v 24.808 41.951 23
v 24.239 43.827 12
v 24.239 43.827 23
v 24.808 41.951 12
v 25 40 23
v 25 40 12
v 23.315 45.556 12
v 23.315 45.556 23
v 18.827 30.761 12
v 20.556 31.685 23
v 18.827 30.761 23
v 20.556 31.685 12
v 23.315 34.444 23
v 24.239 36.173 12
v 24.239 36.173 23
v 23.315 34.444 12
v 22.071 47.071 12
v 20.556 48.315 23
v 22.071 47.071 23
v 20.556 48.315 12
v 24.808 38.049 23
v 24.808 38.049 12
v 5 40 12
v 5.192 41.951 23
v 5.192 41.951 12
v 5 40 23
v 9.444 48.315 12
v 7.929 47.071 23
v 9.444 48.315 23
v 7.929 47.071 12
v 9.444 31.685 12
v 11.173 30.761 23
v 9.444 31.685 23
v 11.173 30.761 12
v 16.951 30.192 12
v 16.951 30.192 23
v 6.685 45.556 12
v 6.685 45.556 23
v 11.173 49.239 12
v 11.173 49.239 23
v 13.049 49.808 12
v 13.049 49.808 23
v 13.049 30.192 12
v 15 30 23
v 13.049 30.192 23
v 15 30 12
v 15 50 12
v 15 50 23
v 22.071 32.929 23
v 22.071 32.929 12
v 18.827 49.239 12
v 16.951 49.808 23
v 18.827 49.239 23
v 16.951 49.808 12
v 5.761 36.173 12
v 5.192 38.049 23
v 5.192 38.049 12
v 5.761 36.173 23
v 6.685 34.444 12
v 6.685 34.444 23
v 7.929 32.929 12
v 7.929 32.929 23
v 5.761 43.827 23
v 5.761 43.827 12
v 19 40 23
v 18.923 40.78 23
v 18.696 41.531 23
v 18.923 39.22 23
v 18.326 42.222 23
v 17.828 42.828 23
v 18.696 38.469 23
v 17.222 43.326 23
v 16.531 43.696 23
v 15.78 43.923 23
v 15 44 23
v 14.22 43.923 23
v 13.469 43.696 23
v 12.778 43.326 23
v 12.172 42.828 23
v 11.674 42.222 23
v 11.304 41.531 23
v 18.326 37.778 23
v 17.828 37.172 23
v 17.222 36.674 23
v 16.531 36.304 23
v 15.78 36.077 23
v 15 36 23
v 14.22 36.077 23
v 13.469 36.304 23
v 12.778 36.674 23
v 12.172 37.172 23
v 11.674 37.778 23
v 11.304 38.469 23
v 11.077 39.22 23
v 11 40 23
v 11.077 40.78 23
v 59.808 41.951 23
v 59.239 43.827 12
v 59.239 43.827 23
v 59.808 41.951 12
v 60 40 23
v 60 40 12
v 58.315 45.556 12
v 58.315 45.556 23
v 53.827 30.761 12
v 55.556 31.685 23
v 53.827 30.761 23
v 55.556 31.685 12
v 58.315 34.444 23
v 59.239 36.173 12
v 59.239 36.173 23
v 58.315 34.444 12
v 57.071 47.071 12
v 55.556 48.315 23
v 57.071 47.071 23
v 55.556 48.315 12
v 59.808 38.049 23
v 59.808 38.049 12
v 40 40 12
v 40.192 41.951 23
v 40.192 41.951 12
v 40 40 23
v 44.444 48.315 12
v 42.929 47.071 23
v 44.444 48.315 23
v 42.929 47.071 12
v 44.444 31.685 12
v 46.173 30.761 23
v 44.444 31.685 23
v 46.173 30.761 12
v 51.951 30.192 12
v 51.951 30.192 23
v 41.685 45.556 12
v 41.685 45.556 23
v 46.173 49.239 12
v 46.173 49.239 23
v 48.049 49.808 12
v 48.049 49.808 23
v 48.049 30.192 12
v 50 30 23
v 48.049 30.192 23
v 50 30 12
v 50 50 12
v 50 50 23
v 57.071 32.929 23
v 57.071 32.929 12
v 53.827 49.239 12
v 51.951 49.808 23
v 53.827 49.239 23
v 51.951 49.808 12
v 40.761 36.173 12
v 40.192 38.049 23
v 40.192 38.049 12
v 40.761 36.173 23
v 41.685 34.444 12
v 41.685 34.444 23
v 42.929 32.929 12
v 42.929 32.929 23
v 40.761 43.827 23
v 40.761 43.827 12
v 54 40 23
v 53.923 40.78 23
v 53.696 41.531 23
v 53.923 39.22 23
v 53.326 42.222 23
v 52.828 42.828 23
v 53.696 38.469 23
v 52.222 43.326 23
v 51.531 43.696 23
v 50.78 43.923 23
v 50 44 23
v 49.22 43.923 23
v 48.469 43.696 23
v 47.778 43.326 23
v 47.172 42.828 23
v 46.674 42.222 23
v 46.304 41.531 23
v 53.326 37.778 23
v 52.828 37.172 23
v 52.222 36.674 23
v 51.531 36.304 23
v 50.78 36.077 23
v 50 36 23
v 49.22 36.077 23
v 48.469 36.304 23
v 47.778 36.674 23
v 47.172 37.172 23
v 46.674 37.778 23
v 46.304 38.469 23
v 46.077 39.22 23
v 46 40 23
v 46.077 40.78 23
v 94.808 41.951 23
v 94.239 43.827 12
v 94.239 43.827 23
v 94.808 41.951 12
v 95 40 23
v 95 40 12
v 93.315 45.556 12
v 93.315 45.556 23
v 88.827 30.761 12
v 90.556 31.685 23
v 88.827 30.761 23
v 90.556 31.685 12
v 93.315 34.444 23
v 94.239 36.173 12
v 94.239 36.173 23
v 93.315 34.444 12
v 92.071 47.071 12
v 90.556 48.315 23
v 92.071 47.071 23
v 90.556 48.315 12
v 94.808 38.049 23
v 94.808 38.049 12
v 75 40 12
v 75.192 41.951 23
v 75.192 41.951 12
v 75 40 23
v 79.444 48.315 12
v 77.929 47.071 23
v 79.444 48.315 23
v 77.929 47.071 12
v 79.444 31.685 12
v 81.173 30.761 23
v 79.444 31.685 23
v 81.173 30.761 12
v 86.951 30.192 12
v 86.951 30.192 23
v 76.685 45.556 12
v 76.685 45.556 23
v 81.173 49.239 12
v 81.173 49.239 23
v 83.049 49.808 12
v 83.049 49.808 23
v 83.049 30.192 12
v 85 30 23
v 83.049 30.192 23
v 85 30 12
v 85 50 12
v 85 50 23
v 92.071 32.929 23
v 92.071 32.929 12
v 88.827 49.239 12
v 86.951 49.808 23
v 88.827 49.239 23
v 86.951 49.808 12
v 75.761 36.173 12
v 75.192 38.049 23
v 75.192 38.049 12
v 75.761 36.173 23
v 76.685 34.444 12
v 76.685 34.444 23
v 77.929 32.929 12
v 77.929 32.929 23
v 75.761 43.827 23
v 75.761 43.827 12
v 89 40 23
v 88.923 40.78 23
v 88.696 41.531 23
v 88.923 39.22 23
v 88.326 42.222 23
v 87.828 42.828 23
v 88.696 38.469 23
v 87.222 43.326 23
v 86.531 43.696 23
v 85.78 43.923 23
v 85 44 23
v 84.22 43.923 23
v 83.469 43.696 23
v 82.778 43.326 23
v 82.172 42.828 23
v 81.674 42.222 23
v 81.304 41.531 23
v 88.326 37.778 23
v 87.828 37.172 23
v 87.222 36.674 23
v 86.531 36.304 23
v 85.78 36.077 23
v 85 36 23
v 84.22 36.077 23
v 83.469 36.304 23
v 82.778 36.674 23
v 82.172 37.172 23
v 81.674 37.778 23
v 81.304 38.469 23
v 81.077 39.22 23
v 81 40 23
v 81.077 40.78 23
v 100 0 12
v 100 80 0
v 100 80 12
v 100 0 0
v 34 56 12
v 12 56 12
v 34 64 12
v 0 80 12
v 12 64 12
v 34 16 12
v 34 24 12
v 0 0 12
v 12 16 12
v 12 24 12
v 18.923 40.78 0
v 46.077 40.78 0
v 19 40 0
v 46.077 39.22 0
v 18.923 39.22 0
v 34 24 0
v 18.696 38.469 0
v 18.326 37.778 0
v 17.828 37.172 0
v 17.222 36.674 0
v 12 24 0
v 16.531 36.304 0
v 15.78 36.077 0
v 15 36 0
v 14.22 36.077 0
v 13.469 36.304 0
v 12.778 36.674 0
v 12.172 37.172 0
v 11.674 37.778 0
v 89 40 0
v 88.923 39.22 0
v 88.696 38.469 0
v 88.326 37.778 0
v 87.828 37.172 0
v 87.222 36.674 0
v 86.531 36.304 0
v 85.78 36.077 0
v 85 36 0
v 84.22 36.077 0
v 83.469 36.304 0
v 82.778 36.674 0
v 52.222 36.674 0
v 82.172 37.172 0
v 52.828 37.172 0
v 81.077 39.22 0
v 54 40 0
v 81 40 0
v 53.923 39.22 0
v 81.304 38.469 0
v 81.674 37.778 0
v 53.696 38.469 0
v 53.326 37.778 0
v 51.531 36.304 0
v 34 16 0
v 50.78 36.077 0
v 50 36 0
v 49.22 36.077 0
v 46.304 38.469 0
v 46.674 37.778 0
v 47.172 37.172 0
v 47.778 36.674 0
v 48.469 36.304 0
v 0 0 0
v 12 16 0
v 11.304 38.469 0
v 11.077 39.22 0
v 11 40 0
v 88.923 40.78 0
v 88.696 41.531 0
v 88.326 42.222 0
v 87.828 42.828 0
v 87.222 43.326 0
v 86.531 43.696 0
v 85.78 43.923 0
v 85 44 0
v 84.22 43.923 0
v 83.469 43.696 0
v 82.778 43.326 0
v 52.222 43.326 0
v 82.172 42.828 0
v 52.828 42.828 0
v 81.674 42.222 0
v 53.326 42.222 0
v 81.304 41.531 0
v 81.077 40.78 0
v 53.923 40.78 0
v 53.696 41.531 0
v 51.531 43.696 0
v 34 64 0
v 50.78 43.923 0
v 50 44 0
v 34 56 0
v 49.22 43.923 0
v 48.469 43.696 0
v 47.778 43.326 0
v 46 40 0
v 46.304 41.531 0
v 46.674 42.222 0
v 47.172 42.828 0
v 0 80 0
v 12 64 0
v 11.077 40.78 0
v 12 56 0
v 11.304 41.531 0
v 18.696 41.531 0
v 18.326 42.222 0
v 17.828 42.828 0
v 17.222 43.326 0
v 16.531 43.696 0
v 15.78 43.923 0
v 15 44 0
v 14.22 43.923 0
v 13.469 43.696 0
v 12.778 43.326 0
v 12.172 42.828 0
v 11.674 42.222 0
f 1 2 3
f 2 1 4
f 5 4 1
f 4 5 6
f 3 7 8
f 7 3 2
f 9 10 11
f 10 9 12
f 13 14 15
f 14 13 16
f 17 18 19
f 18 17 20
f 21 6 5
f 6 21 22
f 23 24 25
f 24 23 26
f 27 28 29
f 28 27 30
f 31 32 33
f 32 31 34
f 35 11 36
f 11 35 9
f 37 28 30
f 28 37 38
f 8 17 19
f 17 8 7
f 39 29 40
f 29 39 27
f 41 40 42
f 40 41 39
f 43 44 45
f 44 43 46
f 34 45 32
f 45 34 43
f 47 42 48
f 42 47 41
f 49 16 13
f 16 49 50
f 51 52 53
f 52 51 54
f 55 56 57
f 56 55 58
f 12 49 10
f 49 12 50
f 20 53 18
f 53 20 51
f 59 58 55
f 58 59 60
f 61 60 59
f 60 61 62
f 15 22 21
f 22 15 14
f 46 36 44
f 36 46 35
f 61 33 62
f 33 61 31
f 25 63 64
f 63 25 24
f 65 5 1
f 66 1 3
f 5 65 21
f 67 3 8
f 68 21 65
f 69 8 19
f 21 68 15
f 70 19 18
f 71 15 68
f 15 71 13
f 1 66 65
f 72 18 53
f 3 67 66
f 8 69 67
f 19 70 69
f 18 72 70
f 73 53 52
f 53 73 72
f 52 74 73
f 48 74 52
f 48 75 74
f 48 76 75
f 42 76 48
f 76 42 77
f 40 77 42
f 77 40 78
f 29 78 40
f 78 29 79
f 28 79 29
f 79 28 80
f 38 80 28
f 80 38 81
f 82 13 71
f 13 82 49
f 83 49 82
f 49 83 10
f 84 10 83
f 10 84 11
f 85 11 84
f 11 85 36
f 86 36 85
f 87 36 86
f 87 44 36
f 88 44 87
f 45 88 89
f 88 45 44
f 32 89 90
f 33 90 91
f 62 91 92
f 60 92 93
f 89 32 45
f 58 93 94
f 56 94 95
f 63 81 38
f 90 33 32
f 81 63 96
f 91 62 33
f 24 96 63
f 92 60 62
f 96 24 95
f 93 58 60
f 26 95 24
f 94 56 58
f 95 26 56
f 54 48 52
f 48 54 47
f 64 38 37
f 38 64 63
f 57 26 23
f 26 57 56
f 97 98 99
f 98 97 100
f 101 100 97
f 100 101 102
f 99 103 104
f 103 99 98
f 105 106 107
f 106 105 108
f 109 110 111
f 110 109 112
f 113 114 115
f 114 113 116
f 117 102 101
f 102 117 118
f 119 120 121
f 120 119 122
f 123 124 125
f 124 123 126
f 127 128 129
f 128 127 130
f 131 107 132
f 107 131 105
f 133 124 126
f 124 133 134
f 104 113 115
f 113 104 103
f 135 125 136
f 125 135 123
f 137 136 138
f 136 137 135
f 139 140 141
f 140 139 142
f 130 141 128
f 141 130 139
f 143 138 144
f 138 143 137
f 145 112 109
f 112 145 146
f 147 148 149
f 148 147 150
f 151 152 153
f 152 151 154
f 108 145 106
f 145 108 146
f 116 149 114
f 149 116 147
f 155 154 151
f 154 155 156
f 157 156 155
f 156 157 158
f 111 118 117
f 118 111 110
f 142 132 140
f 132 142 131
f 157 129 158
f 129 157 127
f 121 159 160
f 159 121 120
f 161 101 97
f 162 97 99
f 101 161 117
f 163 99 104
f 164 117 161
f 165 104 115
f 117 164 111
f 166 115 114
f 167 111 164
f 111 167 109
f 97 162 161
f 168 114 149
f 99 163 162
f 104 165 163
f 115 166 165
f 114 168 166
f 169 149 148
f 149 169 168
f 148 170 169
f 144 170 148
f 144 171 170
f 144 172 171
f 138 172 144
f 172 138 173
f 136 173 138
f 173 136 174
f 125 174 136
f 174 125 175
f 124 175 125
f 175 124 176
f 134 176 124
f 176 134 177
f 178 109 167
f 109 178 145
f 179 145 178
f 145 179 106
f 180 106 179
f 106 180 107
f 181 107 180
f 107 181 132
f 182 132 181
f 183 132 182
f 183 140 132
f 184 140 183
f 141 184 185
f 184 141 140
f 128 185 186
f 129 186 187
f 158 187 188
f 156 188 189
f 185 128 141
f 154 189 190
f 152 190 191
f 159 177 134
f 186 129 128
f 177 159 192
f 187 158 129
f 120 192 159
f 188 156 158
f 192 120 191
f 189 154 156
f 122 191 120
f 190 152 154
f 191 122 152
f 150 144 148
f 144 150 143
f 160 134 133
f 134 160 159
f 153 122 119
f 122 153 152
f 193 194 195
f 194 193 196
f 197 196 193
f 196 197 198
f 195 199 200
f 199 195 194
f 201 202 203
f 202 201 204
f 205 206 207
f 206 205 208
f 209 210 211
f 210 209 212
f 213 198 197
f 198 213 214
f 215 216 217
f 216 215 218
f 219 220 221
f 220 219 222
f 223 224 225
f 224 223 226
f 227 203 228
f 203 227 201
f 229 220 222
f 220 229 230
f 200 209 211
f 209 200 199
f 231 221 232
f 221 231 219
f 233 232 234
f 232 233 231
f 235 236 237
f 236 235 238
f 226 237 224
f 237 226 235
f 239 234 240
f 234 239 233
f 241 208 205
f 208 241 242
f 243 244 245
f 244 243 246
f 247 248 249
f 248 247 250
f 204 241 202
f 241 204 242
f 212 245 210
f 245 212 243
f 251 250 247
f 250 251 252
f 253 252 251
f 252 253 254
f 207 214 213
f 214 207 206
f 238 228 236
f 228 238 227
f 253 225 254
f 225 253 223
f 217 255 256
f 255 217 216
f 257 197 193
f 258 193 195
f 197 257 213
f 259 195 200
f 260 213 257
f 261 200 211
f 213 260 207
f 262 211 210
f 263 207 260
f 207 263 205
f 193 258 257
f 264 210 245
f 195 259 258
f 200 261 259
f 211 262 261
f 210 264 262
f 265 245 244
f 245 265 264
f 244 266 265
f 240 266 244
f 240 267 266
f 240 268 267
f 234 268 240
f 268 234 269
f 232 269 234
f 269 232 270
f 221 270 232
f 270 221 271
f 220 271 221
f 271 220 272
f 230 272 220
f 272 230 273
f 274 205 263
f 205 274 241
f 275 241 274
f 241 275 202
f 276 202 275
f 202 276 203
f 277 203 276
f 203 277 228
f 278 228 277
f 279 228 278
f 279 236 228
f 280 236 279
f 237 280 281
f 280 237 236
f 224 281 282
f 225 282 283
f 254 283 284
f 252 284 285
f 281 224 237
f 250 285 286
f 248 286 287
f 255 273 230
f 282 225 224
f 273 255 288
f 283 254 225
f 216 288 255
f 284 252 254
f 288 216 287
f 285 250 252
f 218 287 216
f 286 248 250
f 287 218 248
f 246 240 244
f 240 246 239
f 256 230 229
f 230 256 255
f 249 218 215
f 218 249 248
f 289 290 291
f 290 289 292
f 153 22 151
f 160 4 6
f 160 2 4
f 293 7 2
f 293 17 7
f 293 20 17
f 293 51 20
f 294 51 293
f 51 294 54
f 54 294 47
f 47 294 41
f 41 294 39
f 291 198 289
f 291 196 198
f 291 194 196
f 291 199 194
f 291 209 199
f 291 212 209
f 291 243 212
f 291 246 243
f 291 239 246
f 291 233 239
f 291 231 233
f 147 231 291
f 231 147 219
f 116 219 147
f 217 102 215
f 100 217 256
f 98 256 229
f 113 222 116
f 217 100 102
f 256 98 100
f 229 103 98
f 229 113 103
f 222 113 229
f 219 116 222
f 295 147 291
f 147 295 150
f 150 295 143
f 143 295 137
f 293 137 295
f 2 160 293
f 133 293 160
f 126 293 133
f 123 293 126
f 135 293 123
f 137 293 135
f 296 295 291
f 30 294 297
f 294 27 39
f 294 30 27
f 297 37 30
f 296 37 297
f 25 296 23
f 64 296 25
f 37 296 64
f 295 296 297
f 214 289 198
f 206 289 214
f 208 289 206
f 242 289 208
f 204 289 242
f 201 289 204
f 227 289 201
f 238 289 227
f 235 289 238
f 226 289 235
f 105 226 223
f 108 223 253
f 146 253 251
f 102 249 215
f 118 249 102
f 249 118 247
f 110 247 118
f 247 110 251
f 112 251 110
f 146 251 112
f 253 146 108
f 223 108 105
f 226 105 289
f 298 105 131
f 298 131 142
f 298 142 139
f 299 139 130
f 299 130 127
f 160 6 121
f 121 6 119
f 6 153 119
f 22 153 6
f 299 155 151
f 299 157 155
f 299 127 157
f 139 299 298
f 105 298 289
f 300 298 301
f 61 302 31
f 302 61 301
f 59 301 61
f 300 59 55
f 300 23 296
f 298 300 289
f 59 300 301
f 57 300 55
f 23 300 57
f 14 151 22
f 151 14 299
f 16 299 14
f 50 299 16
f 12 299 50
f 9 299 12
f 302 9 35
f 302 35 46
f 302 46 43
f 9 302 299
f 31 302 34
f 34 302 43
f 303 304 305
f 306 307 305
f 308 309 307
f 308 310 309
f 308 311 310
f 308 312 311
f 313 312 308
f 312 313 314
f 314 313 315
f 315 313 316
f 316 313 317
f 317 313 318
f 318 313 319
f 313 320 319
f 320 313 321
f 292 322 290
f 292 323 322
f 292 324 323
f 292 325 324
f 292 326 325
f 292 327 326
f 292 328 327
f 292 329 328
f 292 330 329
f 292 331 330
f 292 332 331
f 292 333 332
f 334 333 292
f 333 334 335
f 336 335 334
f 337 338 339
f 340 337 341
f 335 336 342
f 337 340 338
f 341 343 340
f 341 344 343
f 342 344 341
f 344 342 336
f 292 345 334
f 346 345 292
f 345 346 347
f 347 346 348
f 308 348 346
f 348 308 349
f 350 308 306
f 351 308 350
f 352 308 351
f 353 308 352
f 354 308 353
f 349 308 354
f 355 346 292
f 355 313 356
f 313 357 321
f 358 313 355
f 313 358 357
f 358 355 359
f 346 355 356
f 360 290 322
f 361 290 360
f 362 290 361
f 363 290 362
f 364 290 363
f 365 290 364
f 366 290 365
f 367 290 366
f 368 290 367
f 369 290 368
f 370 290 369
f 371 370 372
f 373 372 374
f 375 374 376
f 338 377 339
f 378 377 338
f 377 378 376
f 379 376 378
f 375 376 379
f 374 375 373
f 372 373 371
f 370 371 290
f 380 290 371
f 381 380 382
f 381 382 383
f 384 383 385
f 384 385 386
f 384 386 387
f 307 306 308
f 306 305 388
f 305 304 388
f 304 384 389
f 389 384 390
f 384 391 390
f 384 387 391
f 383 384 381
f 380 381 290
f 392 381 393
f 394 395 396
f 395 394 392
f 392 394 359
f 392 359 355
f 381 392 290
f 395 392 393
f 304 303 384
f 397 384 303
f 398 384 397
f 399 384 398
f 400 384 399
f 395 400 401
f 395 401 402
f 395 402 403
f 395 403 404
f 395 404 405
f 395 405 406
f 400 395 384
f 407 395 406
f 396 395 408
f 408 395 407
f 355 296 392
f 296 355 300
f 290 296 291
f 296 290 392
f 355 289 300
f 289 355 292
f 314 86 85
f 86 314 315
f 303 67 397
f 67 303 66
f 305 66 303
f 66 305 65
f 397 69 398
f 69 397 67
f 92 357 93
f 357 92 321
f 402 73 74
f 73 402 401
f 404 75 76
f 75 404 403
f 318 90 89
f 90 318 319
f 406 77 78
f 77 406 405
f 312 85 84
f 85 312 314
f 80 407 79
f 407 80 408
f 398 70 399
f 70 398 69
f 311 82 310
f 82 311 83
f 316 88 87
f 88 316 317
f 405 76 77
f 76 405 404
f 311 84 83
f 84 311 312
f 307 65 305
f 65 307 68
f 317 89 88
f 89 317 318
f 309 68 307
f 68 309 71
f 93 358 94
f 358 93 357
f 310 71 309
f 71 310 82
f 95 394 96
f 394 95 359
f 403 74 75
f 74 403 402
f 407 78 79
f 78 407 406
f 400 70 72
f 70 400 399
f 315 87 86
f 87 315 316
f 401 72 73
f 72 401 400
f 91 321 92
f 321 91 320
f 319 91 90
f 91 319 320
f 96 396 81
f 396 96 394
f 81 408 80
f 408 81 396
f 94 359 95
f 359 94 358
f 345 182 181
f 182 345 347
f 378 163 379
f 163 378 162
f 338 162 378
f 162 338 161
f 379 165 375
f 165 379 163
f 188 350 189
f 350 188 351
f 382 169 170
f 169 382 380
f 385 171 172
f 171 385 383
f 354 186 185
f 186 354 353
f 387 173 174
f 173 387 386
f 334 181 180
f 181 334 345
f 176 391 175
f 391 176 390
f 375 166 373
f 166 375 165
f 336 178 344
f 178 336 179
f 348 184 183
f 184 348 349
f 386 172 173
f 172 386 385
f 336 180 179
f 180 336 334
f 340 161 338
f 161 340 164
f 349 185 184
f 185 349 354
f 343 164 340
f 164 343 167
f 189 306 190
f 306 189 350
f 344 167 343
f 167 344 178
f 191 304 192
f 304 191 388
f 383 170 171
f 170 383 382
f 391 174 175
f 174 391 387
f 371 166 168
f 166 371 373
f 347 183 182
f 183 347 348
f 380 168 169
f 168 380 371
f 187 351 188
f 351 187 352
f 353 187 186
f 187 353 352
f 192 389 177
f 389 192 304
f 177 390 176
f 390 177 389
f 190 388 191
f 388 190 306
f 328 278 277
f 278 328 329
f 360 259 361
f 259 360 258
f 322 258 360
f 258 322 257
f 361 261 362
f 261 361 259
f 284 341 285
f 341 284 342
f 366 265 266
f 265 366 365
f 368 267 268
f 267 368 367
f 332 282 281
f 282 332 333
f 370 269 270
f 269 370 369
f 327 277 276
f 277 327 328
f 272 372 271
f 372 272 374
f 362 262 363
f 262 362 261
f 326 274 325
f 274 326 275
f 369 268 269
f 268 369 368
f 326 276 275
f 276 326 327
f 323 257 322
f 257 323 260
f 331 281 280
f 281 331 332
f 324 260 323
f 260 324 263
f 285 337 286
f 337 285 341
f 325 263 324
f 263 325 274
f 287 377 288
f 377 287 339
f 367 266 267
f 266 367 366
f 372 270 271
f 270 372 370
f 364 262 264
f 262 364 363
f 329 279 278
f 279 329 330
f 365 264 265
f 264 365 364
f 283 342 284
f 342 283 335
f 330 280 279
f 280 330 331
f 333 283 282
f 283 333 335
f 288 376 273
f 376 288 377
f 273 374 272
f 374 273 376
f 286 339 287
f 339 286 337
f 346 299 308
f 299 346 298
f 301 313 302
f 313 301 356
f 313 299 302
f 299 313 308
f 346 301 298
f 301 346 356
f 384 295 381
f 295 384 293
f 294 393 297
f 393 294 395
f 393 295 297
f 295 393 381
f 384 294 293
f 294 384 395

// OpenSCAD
$fn = 32;

// ----------------------------------------------------------------------
// Drill jig: three_boss_slot jig
// ----------------------------------------------------------------------

// --- parameters (mm) ---
plate_l = 100;            // plate length, X
plate_w = 80;             // plate width, Y
plate_t = 12;             // plate thickness
boss_d = 20;              // guide boss diameter
boss_h = 12;              // boss height above the plate
guide_d = 8;              // guide hole diameter
boss_pitch = 35;          // boss pitch
slot_w = 8;               // clamp slot width
slot_l = 22;              // clamp slot length
slot_x = 12;              // slot start X
fit_tol = 0.02;           // tolerance for press fits, mm
free_tol = 0.2;           // tolerance for clearance fits, mm

n_boss = 3;  // guide bosses
boss_x0 = (plate_l - (n_boss - 1) * boss_pitch) / 2;  // first boss X
boss_top = plate_t - 1 + boss_h;  // boss crown height
total_h = boss_top;  // overall height

difference() {
  union() {
  cube([plate_l, plate_w, plate_t]);
  for (i = [0 : n_boss - 1])
    translate([boss_x0 + i * boss_pitch, plate_w / 2, plate_t - 1])
      cylinder(h = boss_h, d = boss_d);
  }
  for (i = [0 : n_boss - 1])
    translate([boss_x0 + i * boss_pitch, plate_w / 2, -1])
      cylinder(h = plate_t + boss_h, d = guide_d);
  for (cy = [plate_w * 0.25, plate_w * 0.75])
    translate([slot_x, cy - slot_w / 2, -1])
      cube([slot_l, slot_w, plate_t + 2]);
}
